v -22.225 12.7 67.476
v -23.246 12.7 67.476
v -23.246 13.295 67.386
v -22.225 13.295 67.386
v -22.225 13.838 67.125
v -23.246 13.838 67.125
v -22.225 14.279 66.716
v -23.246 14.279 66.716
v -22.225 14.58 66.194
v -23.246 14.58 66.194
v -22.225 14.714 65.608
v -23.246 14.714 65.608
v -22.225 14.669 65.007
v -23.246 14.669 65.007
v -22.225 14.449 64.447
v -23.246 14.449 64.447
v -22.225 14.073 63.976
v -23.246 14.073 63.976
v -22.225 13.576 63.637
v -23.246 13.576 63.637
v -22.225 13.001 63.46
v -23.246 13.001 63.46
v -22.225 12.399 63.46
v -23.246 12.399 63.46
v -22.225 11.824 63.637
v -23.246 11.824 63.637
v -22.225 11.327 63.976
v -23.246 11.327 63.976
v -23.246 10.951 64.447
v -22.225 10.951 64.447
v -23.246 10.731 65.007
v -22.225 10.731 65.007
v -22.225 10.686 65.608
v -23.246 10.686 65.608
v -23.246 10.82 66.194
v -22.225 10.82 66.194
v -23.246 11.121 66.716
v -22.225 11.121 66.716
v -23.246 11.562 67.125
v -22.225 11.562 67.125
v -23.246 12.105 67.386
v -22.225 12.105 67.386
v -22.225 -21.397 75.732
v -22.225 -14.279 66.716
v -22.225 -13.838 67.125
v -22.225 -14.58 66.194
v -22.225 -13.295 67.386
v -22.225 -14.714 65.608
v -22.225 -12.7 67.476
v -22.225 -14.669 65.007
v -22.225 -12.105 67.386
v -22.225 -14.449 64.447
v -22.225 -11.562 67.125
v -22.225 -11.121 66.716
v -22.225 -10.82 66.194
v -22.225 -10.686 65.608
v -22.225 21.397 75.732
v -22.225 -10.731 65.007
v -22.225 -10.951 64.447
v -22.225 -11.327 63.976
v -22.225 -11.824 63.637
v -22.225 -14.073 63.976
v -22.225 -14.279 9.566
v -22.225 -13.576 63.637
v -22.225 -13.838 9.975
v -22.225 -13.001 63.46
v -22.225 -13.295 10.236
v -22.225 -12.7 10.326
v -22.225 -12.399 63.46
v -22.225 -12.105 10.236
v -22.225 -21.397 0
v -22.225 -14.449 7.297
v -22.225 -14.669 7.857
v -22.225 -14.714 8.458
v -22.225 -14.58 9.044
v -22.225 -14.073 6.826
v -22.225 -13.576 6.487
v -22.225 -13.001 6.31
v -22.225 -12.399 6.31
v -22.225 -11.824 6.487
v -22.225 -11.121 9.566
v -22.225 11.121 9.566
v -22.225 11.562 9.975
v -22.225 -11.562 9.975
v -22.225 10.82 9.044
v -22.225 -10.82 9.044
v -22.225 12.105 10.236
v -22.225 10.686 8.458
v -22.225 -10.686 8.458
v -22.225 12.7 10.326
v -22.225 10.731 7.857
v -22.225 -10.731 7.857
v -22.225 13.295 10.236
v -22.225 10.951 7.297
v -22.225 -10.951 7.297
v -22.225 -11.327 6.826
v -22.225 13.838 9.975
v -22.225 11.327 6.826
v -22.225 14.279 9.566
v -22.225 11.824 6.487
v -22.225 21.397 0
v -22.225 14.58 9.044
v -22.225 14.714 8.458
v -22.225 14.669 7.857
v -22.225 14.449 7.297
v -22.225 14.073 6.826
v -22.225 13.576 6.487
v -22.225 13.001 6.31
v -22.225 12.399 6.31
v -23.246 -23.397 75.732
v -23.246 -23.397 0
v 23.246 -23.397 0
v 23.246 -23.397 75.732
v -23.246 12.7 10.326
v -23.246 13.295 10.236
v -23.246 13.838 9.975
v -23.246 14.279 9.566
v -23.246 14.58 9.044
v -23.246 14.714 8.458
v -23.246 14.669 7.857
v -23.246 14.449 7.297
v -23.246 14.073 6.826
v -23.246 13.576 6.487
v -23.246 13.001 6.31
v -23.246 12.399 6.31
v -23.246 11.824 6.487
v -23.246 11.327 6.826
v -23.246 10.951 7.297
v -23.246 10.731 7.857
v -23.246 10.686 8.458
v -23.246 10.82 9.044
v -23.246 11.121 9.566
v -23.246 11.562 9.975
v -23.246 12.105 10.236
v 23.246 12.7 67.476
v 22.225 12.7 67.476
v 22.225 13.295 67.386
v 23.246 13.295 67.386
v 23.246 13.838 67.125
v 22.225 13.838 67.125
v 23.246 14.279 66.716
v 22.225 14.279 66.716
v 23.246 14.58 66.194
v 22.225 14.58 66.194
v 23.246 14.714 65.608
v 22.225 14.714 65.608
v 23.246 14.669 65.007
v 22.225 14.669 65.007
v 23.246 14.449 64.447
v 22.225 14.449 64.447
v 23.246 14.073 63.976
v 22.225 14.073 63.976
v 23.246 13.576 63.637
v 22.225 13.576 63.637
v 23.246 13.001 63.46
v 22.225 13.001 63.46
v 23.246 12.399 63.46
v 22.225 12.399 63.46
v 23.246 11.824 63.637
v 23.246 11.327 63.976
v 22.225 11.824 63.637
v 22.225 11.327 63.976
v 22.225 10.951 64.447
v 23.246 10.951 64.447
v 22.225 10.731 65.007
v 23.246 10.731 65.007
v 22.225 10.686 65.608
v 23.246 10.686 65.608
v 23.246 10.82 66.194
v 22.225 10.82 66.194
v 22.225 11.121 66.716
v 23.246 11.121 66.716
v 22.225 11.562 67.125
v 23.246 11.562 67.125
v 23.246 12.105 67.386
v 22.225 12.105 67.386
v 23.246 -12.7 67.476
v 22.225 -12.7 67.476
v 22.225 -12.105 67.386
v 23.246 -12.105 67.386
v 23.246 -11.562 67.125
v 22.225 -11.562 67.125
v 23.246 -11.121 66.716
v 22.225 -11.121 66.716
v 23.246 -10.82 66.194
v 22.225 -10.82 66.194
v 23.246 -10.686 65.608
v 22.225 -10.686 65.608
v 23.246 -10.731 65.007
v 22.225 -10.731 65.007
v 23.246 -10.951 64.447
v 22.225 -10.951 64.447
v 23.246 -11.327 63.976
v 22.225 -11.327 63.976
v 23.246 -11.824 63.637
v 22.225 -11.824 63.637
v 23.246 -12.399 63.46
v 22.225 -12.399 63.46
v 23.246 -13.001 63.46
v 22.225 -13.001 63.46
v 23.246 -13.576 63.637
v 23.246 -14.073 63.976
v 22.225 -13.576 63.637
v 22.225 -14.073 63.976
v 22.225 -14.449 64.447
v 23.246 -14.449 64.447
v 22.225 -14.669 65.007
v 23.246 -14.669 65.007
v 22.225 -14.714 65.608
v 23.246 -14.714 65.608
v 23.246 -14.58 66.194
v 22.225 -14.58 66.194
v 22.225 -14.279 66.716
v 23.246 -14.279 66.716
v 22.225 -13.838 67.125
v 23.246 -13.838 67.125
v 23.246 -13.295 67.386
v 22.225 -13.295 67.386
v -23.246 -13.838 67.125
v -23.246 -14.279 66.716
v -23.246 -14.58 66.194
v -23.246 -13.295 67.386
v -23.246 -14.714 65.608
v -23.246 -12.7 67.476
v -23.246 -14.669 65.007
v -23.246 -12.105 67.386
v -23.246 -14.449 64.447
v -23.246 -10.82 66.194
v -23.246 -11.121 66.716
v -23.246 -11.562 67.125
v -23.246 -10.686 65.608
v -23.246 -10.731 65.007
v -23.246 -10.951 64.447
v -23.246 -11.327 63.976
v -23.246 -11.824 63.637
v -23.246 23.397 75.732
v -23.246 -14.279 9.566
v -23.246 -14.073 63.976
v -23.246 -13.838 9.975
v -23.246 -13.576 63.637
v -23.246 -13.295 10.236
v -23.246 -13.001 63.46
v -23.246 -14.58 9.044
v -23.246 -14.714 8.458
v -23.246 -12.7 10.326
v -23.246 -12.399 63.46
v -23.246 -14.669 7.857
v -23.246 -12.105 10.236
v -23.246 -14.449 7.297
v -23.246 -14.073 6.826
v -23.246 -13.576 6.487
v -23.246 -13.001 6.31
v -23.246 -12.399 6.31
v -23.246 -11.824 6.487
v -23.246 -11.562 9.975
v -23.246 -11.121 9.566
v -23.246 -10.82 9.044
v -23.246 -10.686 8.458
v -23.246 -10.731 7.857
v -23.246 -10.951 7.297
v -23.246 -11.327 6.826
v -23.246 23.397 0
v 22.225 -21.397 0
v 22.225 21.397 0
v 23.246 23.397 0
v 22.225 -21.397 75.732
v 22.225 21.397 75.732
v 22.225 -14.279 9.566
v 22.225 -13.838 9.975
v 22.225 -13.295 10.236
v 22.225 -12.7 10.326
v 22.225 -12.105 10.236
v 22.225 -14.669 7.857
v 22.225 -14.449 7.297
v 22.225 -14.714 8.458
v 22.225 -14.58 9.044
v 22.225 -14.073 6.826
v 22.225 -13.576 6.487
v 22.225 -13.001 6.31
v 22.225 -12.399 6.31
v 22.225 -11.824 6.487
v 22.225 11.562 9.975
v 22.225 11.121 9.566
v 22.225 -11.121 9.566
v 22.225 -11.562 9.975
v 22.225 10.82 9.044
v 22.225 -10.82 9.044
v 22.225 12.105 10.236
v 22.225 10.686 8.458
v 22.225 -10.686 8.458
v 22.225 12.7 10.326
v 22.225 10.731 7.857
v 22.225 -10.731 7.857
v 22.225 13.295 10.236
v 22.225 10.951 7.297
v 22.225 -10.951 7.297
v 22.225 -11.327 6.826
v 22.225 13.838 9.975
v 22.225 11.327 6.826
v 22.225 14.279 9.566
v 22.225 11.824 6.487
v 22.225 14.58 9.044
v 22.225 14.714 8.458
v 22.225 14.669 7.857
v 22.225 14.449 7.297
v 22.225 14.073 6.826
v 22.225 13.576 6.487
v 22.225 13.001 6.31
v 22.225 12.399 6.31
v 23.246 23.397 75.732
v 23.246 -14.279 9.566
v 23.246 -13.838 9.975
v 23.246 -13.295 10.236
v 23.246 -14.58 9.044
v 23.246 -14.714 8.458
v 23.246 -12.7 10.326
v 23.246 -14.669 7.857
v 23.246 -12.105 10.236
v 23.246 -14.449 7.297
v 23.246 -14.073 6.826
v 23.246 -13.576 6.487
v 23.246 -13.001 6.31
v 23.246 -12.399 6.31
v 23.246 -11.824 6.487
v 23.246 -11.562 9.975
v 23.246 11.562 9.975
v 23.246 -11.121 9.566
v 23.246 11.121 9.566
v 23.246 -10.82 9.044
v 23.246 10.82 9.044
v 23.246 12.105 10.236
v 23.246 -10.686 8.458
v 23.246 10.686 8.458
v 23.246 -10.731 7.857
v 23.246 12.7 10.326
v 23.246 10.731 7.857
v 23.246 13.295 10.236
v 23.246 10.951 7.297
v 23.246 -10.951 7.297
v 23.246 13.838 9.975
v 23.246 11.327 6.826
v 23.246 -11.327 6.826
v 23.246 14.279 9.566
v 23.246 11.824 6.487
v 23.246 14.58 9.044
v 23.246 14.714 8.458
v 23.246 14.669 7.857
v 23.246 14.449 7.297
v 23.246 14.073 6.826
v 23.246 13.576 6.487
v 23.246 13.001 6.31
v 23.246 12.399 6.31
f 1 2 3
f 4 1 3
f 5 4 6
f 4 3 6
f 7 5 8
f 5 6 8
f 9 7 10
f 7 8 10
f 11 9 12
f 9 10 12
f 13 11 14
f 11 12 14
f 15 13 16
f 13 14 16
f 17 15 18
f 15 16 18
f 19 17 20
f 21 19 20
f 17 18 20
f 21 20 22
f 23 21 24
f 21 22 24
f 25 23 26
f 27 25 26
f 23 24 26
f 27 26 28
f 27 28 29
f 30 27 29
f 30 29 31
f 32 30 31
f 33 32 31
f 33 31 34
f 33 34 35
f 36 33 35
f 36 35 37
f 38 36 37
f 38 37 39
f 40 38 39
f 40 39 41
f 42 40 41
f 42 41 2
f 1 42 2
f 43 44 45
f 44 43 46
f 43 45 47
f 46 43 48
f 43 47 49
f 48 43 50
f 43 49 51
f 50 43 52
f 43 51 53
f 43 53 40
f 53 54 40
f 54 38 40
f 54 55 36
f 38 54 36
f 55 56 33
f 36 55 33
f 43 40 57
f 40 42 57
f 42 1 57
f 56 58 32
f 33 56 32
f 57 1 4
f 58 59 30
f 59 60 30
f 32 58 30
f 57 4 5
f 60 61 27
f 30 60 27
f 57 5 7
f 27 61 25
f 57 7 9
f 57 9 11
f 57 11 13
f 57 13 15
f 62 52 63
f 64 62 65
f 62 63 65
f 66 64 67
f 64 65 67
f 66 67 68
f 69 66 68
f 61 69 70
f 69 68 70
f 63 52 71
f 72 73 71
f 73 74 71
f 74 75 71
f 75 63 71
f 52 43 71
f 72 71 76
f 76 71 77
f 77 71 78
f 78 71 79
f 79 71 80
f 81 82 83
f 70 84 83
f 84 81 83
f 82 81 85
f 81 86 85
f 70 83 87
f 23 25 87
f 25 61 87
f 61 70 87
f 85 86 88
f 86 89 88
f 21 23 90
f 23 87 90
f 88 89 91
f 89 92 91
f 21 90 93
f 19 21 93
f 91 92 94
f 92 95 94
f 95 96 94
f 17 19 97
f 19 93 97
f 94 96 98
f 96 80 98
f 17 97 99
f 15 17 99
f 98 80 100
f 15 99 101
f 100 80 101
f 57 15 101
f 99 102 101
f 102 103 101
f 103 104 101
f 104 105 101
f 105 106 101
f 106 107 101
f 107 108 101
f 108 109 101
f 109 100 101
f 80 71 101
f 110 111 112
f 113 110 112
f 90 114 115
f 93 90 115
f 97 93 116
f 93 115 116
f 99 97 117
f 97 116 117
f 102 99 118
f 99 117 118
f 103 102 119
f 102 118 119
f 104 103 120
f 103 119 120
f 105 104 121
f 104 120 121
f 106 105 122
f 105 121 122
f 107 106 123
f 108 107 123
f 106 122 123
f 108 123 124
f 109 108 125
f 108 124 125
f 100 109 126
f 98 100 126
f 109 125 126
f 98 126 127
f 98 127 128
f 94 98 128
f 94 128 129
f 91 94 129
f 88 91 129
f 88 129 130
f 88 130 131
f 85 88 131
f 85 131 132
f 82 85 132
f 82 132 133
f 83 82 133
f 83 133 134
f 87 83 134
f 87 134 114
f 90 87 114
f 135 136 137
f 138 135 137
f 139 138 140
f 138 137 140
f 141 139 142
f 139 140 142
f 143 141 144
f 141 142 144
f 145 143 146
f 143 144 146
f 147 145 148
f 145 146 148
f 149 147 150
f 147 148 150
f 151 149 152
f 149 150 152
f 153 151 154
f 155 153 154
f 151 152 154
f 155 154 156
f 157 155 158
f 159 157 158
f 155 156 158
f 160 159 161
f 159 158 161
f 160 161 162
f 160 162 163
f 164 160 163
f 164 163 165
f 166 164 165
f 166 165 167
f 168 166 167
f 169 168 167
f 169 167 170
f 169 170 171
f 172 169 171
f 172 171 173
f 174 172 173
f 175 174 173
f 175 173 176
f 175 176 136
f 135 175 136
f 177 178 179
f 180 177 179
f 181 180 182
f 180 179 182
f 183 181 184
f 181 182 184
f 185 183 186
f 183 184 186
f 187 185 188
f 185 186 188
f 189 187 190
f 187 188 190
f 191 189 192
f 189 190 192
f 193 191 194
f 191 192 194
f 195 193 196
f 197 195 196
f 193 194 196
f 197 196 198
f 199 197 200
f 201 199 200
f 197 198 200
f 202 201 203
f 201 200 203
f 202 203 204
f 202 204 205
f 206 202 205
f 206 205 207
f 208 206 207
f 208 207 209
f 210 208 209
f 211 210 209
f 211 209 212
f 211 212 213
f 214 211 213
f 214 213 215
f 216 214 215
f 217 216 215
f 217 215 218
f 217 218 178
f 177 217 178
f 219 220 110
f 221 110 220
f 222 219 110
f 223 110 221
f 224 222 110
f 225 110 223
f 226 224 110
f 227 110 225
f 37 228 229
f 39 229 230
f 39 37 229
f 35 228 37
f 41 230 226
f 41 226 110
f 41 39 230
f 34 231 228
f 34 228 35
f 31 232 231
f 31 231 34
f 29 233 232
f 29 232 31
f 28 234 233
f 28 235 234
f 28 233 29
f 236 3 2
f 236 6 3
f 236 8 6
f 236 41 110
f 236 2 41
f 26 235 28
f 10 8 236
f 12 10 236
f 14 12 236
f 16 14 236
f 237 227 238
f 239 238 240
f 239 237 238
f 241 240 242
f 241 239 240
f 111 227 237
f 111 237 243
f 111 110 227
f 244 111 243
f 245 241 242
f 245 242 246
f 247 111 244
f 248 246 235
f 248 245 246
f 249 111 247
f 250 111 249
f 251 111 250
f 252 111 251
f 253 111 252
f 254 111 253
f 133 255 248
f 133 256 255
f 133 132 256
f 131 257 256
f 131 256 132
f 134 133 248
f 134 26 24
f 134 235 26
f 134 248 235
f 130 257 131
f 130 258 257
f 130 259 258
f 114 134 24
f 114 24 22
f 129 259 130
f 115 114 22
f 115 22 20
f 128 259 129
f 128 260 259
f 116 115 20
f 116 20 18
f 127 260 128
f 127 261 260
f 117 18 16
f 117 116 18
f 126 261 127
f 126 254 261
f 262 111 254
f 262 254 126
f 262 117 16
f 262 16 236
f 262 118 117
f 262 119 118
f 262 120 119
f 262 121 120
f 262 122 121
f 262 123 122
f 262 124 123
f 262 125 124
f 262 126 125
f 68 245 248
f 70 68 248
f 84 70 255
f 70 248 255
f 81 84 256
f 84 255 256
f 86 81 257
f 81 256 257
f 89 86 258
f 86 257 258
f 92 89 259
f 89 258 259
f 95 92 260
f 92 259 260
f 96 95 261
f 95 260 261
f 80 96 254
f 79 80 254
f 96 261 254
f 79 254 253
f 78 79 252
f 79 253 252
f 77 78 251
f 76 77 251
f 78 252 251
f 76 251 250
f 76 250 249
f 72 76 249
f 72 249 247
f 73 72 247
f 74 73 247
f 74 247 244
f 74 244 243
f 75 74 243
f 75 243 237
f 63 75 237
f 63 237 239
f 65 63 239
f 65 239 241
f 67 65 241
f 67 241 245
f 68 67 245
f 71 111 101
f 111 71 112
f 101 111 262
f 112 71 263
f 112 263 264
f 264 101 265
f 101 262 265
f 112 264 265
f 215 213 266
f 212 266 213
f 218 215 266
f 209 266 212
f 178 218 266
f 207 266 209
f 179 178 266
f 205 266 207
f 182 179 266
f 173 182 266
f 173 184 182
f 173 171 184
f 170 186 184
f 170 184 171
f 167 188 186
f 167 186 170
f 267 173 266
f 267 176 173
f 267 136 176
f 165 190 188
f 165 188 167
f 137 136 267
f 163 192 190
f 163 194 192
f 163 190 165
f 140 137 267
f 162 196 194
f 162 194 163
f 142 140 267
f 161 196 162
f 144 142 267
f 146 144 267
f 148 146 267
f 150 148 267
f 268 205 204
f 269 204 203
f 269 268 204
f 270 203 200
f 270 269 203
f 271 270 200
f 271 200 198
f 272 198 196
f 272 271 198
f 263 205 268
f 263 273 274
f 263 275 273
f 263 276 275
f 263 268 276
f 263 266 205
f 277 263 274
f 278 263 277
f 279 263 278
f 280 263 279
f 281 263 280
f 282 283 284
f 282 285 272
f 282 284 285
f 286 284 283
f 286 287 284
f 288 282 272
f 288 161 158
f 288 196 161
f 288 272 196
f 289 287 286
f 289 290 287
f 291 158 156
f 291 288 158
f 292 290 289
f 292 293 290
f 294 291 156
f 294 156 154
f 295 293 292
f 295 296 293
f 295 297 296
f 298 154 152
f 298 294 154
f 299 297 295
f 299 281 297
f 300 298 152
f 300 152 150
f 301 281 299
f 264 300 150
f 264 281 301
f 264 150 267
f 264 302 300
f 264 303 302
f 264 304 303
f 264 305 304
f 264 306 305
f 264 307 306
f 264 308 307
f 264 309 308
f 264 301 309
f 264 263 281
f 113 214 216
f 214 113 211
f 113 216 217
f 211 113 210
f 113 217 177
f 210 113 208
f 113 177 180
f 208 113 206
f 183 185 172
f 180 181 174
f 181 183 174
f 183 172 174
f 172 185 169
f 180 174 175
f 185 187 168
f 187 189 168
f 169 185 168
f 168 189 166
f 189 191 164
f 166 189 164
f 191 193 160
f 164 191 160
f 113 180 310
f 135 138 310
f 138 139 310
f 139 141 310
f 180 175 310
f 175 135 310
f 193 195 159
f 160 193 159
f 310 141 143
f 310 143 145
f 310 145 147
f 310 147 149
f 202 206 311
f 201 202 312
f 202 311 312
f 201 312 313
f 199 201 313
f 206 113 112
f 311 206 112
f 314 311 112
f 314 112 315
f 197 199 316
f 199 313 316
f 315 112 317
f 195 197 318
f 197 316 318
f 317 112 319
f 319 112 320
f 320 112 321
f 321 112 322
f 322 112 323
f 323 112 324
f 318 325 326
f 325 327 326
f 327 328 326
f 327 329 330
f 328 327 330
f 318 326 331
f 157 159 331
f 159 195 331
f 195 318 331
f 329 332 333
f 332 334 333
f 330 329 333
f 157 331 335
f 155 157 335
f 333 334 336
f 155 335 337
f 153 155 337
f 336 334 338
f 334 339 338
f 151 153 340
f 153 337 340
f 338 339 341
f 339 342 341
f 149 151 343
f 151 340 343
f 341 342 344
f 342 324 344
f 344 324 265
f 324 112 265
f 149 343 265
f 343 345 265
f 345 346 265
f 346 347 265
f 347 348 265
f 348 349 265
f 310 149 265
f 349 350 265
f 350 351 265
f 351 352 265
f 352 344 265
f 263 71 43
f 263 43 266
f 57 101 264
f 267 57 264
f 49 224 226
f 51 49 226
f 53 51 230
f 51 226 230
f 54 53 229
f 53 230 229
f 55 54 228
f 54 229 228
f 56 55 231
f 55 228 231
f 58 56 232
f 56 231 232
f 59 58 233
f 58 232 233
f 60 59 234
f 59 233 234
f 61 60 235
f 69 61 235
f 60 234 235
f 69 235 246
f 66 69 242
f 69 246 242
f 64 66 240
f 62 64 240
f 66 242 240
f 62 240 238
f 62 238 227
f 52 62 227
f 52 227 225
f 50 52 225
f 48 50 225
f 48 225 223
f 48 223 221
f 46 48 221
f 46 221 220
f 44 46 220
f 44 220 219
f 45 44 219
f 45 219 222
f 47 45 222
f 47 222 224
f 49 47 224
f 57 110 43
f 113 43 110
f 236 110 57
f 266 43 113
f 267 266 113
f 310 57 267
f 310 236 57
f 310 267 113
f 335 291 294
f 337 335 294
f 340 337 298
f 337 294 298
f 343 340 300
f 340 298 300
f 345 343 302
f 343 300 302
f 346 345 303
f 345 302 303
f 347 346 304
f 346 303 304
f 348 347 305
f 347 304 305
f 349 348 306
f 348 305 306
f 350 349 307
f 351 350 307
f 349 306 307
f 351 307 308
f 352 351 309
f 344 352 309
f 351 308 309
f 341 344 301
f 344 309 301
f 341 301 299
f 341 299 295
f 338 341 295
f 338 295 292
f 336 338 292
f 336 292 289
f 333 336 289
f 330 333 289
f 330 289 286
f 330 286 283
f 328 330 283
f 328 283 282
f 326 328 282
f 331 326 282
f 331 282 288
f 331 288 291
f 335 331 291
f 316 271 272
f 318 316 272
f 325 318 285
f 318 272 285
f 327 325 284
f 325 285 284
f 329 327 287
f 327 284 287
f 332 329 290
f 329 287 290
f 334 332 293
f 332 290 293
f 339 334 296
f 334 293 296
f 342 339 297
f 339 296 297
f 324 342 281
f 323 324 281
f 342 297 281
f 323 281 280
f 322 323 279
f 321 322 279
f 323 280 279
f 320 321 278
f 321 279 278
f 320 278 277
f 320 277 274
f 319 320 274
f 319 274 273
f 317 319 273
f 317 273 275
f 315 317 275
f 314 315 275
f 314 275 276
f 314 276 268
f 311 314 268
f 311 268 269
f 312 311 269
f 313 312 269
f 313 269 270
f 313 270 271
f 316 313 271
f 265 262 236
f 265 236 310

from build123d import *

# Parameters (mm, degrees)
CROQUIS1_W              = 46.491525
CROQUIS1_H              = 46.794250074
CROQUIS1_W_2            = 44.45
CROQUIS1_H_2            = 42.793750074
SALIENTE_EXTRUIR1_DEPTH = 75.731700962
CROQUIS2_R              = 2.0193
CORTAR_EXTRUIR1_DEPTH   = 92.89220798


with BuildPart() as part:
    # Croquis1 → Saliente-Extruir1 (new body)
    with BuildSketch(Plane.XY):
        Rectangle(CROQUIS1_W, CROQUIS1_H)
        Rectangle(CROQUIS1_W_2, CROQUIS1_H_2, mode=Mode.SUBTRACT)
    extrude(amount=SALIENTE_EXTRUIR1_DEPTH)

    # Croquis2 → Cortar-Extruir1 (cut, through all)
    with BuildSketch(Plane(origin=(-23.2457625, 0, 0), x_dir=(0, 1, 0), z_dir=(-1, 0, 0))):
        with Locations(Location((12.699999873, -65.456700938, 0), (0, 0, 270))):
            Circle(CROQUIS2_R)
        with Locations(Location((-12.699999873, -65.456700938, 0), (0, 0, 270))):
            Circle(CROQUIS2_R)
        with Locations(Location((-12.699999873, -8.306700938, 0), (0, 0, 270))):
            Circle(CROQUIS2_R)
        with Locations(Location((12.699999873, -8.306700938, 0), (0, 0, 270))):
            Circle(CROQUIS2_R)
    extrude(amount=-CORTAR_EXTRUIR1_DEPTH, mode=Mode.SUBTRACT)


solid = part.part
